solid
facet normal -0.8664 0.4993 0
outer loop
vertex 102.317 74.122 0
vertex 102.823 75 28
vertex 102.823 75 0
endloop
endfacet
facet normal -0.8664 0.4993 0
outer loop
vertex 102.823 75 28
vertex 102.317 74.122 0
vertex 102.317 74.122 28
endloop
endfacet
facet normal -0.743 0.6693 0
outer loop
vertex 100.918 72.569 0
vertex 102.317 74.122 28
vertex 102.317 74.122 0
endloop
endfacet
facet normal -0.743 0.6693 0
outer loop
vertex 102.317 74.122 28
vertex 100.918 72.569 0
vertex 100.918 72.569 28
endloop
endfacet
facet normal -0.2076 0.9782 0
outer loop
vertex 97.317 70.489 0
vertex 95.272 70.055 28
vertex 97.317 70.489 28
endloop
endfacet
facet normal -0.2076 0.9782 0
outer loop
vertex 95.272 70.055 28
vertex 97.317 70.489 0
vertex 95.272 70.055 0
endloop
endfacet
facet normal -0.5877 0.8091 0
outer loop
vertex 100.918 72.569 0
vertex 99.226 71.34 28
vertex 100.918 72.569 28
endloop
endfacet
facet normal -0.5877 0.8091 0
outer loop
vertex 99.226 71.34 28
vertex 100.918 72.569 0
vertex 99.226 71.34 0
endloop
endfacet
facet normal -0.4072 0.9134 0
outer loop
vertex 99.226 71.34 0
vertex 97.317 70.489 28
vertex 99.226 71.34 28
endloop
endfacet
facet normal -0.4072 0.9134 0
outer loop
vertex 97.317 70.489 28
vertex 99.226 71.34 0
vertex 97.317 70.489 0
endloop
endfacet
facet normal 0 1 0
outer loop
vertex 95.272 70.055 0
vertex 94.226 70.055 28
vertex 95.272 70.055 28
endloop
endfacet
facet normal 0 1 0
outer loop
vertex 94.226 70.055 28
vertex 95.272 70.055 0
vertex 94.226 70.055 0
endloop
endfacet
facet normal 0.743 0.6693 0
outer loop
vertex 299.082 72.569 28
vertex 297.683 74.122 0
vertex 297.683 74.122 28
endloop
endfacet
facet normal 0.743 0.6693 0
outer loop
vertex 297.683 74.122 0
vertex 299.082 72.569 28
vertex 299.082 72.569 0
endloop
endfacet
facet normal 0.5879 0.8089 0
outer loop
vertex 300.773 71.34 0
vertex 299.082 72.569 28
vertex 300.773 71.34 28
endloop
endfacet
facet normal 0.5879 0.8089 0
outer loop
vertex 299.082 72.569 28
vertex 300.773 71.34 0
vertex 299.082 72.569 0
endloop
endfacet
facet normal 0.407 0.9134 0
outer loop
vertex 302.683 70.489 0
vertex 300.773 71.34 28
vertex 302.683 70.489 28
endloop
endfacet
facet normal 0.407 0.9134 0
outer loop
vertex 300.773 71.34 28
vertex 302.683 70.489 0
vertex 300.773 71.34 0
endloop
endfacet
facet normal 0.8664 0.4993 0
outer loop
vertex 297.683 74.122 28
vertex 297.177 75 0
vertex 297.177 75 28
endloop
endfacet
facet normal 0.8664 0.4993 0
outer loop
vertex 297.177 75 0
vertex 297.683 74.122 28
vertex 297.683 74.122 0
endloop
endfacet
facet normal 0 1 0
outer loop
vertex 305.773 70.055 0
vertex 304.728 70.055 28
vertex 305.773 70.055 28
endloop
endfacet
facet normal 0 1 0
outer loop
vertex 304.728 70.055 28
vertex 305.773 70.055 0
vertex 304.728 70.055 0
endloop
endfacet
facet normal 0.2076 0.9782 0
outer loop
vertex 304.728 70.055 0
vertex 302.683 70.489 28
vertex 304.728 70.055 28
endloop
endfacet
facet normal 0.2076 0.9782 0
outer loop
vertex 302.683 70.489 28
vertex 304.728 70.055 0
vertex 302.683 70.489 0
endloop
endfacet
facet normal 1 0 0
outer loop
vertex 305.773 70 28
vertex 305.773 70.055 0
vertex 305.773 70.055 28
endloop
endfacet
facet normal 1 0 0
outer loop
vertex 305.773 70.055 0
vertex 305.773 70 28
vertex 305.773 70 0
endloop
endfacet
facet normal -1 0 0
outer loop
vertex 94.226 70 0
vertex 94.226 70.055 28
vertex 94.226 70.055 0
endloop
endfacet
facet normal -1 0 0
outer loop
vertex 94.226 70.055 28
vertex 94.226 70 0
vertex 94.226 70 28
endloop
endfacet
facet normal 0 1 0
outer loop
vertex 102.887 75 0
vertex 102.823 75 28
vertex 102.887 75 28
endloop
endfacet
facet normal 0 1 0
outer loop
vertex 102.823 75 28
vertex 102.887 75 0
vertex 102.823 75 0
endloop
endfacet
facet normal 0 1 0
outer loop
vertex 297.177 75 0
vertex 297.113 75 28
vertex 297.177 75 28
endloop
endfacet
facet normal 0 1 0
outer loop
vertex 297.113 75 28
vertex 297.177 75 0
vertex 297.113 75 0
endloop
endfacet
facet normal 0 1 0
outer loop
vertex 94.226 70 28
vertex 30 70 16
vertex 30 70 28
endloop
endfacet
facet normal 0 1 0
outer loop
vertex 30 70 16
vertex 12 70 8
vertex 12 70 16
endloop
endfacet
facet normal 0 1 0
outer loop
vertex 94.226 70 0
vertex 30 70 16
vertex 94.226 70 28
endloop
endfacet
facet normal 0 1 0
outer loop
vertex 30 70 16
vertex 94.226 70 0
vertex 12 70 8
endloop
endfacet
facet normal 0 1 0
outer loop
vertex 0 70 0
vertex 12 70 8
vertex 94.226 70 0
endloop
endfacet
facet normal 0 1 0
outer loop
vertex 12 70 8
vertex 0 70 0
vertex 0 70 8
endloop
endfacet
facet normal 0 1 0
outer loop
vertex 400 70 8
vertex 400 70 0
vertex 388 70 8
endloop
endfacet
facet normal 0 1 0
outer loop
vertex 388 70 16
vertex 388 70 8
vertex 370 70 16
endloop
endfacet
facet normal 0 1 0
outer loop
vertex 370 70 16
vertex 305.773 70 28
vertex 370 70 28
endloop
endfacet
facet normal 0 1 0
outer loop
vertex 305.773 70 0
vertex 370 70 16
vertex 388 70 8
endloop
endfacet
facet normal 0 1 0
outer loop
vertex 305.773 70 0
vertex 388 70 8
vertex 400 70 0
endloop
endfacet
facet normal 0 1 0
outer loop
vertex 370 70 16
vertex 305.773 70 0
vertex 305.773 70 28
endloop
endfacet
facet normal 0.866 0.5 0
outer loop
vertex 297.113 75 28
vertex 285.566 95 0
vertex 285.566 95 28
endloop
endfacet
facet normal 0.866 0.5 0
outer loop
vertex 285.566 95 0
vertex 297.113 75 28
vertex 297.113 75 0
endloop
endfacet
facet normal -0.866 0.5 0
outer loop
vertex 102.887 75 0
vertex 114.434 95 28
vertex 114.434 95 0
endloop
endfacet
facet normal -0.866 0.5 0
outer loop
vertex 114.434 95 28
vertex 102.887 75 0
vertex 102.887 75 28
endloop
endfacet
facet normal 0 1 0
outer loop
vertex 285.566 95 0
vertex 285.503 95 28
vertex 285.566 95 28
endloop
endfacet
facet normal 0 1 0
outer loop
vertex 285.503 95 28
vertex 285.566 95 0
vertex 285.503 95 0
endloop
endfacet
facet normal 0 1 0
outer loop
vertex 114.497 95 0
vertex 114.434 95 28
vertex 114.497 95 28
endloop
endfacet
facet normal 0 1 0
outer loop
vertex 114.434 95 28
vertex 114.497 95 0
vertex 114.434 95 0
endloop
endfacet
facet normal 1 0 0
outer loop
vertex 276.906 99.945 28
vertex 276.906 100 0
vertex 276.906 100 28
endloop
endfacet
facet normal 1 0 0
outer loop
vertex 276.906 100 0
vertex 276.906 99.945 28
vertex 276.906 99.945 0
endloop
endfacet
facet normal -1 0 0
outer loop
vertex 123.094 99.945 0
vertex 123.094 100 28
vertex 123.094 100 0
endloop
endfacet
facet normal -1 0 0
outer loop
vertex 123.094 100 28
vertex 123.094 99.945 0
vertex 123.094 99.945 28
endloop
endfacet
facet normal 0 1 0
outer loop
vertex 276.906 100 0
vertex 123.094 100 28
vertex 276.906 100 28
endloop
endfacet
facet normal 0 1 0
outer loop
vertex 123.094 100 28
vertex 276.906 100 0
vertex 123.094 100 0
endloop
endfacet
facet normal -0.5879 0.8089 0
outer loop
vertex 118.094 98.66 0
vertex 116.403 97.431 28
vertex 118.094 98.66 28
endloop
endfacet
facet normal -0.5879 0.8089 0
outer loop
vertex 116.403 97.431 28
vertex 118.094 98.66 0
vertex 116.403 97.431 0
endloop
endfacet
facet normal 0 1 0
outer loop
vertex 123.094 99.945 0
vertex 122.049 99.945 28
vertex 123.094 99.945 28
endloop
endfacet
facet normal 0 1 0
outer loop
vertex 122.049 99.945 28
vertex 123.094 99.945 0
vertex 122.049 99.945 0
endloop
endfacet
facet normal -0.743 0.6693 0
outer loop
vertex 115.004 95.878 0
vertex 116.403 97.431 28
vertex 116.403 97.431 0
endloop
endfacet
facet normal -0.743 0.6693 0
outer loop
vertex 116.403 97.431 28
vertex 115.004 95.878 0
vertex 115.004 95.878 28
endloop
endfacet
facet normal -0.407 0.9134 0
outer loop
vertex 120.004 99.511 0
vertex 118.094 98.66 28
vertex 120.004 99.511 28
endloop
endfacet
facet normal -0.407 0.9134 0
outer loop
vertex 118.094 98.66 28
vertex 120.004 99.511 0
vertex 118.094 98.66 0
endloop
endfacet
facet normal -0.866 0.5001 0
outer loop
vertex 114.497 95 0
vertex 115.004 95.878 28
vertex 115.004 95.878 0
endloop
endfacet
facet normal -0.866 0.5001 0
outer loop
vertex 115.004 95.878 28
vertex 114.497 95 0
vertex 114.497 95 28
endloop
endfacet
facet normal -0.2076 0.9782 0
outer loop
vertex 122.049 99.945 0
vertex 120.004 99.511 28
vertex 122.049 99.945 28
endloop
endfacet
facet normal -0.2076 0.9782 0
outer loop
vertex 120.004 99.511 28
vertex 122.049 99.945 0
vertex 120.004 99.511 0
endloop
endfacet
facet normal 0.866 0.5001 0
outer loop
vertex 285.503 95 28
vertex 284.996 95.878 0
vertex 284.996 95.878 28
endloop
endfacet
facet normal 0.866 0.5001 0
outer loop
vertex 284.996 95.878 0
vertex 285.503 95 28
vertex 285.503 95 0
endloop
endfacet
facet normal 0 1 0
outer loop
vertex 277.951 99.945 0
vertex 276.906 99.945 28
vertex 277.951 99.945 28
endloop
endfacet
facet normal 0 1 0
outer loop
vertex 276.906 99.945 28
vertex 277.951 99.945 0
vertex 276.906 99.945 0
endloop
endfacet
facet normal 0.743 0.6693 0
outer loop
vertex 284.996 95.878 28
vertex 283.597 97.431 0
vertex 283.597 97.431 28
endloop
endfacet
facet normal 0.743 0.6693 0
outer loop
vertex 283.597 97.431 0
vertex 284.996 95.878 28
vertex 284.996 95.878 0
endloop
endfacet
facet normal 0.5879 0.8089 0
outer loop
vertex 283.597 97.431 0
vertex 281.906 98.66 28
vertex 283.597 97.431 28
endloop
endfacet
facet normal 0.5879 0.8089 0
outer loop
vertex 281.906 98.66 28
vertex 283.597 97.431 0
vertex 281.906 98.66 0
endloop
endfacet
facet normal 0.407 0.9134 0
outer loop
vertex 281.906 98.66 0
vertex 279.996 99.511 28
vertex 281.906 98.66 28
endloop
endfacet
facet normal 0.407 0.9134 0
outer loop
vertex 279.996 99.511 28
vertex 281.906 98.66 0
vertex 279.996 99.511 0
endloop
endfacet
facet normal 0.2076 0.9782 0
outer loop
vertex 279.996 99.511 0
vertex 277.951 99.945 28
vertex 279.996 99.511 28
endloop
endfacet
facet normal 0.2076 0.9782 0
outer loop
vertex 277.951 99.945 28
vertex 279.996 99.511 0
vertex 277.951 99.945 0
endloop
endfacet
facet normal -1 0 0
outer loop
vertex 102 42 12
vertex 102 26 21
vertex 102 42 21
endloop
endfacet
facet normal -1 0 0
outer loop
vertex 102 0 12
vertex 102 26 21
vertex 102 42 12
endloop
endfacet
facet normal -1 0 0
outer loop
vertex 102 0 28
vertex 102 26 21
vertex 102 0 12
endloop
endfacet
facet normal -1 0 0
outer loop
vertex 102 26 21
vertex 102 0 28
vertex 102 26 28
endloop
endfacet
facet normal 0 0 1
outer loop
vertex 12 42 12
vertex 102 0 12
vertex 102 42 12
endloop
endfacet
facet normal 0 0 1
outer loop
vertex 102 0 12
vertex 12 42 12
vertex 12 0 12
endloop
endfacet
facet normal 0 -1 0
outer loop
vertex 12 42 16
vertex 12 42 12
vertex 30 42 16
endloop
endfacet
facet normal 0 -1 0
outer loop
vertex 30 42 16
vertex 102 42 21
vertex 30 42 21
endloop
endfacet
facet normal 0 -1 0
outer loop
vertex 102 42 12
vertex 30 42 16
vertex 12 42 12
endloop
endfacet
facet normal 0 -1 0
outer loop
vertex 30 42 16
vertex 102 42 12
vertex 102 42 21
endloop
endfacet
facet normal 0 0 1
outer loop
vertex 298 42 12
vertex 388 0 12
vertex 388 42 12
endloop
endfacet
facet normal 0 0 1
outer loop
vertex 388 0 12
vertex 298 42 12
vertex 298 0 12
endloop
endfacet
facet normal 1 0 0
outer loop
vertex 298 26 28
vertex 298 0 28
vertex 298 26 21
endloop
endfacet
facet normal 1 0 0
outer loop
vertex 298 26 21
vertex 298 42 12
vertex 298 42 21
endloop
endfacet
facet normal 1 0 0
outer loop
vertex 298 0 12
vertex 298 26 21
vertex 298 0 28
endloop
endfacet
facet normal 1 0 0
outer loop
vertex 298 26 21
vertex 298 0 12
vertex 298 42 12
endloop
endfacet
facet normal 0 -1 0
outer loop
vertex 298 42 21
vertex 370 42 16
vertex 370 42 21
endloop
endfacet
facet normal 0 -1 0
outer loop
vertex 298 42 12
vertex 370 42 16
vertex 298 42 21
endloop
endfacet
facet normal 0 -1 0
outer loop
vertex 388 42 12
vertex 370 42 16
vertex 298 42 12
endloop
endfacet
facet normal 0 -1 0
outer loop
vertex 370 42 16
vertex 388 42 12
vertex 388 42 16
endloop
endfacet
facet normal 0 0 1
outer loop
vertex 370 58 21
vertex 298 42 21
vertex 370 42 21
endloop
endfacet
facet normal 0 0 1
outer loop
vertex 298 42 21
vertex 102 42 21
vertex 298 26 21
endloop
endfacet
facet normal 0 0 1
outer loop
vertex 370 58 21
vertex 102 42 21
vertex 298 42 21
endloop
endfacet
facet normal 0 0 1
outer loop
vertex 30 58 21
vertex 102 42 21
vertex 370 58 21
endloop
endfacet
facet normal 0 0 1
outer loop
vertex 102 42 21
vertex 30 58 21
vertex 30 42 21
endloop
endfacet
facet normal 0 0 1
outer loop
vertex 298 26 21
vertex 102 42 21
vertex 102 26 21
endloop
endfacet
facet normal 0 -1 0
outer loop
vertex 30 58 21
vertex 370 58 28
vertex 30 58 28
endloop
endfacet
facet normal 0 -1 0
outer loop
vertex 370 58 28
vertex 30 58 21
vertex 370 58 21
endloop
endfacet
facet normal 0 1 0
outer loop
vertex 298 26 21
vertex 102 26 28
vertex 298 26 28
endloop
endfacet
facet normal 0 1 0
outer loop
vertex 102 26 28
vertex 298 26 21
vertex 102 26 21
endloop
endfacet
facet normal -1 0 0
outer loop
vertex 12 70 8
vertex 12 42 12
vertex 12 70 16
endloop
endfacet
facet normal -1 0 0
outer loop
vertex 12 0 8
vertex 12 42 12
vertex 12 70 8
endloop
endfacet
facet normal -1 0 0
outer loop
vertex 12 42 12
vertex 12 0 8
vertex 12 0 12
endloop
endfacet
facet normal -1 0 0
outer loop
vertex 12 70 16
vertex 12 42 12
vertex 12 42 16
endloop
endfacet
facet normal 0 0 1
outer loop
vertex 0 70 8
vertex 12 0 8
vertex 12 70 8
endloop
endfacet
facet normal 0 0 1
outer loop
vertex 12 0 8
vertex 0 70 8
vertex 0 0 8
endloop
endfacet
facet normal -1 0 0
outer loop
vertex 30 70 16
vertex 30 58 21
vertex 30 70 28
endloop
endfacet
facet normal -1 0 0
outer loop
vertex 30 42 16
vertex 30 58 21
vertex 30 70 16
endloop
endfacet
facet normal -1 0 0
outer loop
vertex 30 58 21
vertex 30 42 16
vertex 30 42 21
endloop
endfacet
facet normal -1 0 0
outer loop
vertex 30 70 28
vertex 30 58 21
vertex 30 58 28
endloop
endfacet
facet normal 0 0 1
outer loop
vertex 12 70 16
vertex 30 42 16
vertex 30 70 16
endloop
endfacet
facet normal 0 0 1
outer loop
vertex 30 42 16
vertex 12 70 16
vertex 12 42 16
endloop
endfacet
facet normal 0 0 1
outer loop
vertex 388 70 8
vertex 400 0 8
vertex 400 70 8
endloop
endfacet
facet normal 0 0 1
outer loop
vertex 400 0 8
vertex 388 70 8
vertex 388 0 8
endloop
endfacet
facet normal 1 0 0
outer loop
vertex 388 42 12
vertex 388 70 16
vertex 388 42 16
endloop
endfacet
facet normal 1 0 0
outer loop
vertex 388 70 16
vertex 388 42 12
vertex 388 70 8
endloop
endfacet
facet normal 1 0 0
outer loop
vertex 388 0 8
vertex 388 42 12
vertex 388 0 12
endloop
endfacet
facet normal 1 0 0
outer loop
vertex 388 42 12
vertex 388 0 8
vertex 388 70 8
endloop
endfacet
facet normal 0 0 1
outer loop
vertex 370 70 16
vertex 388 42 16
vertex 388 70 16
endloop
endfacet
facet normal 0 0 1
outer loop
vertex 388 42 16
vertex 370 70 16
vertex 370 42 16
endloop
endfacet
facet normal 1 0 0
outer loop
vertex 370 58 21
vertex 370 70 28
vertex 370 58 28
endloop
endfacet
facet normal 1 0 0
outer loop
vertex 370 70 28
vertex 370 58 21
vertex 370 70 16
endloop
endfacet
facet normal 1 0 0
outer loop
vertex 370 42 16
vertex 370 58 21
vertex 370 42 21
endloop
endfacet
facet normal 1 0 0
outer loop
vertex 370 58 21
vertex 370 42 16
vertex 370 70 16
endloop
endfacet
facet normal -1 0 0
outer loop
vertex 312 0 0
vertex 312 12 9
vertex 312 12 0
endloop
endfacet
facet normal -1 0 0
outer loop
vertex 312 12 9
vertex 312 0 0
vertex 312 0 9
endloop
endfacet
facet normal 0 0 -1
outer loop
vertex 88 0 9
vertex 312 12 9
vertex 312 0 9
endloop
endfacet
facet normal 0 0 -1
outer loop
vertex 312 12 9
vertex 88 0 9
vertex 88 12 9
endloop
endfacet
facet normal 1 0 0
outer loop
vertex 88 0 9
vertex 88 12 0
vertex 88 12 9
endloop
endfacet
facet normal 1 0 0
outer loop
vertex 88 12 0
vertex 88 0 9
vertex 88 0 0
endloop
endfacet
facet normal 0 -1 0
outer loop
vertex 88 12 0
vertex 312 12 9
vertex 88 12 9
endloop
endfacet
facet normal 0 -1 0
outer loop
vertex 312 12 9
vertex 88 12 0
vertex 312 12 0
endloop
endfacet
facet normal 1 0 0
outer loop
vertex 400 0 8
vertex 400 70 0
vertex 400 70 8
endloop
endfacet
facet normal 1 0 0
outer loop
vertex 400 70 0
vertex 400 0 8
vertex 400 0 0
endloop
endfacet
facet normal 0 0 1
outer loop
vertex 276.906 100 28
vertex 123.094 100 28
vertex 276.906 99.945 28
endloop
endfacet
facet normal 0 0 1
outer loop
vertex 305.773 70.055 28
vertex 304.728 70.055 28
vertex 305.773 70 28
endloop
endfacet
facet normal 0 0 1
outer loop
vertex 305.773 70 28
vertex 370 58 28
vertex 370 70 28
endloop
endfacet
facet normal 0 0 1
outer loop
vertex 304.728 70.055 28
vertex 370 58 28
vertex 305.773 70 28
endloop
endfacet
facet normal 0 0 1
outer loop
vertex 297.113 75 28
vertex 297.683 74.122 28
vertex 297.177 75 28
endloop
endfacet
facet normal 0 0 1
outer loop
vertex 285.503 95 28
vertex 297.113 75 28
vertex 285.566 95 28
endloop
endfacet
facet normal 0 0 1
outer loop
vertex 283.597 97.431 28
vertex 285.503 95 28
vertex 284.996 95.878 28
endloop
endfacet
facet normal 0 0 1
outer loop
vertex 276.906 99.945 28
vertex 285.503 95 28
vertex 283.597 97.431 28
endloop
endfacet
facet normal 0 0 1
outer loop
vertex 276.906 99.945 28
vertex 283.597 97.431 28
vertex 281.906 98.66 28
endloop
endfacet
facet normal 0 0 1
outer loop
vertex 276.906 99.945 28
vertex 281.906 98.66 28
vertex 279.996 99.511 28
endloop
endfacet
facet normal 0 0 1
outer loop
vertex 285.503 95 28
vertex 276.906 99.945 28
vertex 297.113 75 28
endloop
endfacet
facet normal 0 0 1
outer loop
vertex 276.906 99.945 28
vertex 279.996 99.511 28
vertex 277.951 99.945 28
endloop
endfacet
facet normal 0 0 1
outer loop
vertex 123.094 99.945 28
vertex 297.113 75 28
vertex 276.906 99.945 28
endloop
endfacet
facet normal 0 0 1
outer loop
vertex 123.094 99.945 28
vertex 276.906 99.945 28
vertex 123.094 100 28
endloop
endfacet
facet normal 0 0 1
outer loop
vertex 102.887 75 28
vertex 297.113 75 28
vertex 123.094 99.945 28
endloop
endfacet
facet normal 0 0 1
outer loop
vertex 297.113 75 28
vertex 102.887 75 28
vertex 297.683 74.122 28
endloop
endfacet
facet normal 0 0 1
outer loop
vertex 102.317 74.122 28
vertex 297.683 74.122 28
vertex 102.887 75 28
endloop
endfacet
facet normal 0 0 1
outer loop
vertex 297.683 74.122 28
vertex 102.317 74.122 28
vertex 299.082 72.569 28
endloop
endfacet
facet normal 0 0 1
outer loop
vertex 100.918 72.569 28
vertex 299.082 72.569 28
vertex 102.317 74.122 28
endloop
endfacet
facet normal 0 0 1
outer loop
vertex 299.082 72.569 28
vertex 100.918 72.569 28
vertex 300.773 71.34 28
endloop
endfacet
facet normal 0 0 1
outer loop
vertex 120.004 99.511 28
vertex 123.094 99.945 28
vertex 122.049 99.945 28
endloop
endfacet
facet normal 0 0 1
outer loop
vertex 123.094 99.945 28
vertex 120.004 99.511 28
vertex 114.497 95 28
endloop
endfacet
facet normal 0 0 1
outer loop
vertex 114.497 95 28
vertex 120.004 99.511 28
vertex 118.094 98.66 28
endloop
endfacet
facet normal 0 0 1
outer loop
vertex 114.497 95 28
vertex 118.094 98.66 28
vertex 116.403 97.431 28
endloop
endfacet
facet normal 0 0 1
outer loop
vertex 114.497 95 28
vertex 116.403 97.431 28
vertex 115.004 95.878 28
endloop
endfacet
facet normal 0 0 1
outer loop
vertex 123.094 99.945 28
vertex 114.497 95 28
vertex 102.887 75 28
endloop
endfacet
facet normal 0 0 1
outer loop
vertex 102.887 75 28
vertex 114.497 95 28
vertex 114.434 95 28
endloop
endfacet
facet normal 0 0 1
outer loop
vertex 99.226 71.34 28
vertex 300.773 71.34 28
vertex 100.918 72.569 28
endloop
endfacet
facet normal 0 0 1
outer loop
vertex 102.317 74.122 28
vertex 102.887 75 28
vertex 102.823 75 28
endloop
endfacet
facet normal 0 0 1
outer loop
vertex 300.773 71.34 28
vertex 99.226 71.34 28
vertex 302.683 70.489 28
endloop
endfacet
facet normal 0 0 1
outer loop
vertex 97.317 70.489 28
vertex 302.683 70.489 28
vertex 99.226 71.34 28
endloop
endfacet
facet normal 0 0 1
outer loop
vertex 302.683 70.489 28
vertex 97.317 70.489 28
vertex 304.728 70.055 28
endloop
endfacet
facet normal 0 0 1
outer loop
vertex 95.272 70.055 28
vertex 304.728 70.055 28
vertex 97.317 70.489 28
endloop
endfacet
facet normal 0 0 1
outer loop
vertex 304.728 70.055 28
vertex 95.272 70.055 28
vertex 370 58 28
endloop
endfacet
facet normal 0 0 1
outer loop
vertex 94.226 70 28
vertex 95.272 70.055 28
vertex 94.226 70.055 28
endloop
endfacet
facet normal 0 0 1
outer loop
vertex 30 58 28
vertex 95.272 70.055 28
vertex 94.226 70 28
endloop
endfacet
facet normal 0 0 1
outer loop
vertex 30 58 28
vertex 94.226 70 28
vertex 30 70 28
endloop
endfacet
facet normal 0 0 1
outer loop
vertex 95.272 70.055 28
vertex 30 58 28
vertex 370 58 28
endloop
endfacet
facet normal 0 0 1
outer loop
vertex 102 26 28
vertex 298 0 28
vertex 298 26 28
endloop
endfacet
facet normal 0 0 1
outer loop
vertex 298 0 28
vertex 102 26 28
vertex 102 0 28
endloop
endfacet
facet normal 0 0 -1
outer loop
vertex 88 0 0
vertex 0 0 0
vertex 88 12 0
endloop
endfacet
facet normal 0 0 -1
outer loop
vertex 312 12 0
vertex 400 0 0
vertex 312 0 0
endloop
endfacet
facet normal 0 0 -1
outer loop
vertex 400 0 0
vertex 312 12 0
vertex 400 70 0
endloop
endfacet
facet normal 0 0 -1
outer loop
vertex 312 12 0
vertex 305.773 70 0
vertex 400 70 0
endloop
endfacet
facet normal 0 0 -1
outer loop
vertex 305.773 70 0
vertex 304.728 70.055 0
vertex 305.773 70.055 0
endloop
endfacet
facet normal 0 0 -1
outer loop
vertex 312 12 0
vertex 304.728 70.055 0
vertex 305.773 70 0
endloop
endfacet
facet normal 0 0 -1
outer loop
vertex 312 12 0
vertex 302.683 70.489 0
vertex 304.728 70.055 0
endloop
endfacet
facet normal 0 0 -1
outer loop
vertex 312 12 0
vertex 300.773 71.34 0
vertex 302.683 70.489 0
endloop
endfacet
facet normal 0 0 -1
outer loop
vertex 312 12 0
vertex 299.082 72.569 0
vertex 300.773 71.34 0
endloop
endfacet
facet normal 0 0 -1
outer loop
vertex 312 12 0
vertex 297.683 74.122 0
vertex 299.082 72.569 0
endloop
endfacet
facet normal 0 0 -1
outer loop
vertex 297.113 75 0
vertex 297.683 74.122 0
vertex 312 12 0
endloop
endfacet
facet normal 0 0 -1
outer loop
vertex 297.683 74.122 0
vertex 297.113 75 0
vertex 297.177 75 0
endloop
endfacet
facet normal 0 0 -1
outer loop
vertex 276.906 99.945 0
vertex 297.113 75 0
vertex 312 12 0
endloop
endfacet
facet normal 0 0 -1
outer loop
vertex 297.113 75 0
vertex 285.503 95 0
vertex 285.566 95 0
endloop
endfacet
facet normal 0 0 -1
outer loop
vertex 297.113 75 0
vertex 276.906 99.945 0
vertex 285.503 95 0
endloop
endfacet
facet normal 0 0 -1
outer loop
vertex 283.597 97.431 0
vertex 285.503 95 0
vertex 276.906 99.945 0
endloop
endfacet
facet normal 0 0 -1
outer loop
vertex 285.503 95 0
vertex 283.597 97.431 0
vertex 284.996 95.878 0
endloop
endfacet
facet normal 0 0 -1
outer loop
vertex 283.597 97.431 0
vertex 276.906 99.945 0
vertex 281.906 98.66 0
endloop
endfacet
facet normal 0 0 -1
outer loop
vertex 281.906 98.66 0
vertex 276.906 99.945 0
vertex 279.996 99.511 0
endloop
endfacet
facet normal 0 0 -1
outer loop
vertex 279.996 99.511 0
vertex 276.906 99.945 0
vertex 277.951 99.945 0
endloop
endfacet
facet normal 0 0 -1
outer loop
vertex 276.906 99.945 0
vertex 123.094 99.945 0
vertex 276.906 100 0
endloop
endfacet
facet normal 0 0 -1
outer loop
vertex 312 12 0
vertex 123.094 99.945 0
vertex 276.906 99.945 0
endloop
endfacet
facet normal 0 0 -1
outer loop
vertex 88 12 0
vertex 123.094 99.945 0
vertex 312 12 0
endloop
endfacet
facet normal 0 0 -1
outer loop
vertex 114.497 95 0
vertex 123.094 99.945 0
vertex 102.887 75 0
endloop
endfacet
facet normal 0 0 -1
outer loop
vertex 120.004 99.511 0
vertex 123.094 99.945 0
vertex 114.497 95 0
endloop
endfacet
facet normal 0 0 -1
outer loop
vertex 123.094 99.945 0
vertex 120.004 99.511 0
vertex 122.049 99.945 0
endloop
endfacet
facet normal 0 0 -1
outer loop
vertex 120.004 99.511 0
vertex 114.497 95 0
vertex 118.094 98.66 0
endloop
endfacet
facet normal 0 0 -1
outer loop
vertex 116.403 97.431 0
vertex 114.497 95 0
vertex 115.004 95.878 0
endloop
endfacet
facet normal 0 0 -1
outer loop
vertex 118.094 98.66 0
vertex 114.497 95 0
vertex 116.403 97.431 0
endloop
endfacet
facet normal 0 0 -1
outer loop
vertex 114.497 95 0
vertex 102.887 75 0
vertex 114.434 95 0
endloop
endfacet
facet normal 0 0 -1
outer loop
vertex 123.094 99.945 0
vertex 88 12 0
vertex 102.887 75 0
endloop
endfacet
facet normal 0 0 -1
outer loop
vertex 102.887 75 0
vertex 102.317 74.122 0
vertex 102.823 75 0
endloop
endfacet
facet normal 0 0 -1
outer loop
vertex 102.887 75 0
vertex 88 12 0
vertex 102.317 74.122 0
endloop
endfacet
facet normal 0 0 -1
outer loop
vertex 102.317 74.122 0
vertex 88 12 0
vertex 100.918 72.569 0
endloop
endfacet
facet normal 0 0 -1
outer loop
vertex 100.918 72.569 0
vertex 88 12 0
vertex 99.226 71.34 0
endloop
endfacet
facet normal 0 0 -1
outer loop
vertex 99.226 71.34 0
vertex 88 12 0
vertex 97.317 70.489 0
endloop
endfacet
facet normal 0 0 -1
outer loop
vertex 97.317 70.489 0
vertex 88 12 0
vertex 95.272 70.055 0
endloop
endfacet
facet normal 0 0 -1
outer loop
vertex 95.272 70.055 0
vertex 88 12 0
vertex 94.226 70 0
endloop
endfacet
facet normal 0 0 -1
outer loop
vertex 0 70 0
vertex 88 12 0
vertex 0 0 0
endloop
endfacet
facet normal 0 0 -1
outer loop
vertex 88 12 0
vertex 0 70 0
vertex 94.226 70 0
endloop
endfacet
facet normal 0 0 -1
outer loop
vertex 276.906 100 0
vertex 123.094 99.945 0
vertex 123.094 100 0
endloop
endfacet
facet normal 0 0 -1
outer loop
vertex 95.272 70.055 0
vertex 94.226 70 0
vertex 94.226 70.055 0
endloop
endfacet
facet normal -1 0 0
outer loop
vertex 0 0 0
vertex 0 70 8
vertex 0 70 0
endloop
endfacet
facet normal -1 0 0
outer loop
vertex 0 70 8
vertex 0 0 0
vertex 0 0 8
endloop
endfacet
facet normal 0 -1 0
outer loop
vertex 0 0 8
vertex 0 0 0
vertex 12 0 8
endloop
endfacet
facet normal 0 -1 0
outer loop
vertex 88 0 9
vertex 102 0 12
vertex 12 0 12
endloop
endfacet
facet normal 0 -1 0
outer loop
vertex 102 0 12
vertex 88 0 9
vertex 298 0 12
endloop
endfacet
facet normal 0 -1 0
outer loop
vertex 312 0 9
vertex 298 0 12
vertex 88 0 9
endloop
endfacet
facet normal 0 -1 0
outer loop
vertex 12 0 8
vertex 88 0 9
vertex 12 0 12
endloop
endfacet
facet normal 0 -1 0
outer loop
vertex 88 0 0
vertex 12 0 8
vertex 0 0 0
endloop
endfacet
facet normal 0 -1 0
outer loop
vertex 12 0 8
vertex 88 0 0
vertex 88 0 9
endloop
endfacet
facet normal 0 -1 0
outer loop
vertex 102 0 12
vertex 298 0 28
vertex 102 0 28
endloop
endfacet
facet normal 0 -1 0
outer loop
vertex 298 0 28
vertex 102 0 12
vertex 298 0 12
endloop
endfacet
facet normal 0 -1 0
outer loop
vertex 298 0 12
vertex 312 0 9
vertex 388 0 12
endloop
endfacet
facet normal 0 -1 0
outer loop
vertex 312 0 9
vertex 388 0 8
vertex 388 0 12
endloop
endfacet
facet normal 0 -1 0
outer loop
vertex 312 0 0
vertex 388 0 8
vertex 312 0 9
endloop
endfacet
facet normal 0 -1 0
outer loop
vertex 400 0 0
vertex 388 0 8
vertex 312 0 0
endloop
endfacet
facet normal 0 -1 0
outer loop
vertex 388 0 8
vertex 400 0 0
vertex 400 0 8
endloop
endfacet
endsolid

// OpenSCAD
include <../src/wardrobe.scad>;
plank_xz_rear_top(wardrobe_n);
//github_openscad -o wardrobe_3/plank_xz_rear_top.stl -D wardrobe_n=3 -D cutting_edge=0 -D break_view_length=0 wardrobe_3/plank_xz_rear_top_stl.scad
